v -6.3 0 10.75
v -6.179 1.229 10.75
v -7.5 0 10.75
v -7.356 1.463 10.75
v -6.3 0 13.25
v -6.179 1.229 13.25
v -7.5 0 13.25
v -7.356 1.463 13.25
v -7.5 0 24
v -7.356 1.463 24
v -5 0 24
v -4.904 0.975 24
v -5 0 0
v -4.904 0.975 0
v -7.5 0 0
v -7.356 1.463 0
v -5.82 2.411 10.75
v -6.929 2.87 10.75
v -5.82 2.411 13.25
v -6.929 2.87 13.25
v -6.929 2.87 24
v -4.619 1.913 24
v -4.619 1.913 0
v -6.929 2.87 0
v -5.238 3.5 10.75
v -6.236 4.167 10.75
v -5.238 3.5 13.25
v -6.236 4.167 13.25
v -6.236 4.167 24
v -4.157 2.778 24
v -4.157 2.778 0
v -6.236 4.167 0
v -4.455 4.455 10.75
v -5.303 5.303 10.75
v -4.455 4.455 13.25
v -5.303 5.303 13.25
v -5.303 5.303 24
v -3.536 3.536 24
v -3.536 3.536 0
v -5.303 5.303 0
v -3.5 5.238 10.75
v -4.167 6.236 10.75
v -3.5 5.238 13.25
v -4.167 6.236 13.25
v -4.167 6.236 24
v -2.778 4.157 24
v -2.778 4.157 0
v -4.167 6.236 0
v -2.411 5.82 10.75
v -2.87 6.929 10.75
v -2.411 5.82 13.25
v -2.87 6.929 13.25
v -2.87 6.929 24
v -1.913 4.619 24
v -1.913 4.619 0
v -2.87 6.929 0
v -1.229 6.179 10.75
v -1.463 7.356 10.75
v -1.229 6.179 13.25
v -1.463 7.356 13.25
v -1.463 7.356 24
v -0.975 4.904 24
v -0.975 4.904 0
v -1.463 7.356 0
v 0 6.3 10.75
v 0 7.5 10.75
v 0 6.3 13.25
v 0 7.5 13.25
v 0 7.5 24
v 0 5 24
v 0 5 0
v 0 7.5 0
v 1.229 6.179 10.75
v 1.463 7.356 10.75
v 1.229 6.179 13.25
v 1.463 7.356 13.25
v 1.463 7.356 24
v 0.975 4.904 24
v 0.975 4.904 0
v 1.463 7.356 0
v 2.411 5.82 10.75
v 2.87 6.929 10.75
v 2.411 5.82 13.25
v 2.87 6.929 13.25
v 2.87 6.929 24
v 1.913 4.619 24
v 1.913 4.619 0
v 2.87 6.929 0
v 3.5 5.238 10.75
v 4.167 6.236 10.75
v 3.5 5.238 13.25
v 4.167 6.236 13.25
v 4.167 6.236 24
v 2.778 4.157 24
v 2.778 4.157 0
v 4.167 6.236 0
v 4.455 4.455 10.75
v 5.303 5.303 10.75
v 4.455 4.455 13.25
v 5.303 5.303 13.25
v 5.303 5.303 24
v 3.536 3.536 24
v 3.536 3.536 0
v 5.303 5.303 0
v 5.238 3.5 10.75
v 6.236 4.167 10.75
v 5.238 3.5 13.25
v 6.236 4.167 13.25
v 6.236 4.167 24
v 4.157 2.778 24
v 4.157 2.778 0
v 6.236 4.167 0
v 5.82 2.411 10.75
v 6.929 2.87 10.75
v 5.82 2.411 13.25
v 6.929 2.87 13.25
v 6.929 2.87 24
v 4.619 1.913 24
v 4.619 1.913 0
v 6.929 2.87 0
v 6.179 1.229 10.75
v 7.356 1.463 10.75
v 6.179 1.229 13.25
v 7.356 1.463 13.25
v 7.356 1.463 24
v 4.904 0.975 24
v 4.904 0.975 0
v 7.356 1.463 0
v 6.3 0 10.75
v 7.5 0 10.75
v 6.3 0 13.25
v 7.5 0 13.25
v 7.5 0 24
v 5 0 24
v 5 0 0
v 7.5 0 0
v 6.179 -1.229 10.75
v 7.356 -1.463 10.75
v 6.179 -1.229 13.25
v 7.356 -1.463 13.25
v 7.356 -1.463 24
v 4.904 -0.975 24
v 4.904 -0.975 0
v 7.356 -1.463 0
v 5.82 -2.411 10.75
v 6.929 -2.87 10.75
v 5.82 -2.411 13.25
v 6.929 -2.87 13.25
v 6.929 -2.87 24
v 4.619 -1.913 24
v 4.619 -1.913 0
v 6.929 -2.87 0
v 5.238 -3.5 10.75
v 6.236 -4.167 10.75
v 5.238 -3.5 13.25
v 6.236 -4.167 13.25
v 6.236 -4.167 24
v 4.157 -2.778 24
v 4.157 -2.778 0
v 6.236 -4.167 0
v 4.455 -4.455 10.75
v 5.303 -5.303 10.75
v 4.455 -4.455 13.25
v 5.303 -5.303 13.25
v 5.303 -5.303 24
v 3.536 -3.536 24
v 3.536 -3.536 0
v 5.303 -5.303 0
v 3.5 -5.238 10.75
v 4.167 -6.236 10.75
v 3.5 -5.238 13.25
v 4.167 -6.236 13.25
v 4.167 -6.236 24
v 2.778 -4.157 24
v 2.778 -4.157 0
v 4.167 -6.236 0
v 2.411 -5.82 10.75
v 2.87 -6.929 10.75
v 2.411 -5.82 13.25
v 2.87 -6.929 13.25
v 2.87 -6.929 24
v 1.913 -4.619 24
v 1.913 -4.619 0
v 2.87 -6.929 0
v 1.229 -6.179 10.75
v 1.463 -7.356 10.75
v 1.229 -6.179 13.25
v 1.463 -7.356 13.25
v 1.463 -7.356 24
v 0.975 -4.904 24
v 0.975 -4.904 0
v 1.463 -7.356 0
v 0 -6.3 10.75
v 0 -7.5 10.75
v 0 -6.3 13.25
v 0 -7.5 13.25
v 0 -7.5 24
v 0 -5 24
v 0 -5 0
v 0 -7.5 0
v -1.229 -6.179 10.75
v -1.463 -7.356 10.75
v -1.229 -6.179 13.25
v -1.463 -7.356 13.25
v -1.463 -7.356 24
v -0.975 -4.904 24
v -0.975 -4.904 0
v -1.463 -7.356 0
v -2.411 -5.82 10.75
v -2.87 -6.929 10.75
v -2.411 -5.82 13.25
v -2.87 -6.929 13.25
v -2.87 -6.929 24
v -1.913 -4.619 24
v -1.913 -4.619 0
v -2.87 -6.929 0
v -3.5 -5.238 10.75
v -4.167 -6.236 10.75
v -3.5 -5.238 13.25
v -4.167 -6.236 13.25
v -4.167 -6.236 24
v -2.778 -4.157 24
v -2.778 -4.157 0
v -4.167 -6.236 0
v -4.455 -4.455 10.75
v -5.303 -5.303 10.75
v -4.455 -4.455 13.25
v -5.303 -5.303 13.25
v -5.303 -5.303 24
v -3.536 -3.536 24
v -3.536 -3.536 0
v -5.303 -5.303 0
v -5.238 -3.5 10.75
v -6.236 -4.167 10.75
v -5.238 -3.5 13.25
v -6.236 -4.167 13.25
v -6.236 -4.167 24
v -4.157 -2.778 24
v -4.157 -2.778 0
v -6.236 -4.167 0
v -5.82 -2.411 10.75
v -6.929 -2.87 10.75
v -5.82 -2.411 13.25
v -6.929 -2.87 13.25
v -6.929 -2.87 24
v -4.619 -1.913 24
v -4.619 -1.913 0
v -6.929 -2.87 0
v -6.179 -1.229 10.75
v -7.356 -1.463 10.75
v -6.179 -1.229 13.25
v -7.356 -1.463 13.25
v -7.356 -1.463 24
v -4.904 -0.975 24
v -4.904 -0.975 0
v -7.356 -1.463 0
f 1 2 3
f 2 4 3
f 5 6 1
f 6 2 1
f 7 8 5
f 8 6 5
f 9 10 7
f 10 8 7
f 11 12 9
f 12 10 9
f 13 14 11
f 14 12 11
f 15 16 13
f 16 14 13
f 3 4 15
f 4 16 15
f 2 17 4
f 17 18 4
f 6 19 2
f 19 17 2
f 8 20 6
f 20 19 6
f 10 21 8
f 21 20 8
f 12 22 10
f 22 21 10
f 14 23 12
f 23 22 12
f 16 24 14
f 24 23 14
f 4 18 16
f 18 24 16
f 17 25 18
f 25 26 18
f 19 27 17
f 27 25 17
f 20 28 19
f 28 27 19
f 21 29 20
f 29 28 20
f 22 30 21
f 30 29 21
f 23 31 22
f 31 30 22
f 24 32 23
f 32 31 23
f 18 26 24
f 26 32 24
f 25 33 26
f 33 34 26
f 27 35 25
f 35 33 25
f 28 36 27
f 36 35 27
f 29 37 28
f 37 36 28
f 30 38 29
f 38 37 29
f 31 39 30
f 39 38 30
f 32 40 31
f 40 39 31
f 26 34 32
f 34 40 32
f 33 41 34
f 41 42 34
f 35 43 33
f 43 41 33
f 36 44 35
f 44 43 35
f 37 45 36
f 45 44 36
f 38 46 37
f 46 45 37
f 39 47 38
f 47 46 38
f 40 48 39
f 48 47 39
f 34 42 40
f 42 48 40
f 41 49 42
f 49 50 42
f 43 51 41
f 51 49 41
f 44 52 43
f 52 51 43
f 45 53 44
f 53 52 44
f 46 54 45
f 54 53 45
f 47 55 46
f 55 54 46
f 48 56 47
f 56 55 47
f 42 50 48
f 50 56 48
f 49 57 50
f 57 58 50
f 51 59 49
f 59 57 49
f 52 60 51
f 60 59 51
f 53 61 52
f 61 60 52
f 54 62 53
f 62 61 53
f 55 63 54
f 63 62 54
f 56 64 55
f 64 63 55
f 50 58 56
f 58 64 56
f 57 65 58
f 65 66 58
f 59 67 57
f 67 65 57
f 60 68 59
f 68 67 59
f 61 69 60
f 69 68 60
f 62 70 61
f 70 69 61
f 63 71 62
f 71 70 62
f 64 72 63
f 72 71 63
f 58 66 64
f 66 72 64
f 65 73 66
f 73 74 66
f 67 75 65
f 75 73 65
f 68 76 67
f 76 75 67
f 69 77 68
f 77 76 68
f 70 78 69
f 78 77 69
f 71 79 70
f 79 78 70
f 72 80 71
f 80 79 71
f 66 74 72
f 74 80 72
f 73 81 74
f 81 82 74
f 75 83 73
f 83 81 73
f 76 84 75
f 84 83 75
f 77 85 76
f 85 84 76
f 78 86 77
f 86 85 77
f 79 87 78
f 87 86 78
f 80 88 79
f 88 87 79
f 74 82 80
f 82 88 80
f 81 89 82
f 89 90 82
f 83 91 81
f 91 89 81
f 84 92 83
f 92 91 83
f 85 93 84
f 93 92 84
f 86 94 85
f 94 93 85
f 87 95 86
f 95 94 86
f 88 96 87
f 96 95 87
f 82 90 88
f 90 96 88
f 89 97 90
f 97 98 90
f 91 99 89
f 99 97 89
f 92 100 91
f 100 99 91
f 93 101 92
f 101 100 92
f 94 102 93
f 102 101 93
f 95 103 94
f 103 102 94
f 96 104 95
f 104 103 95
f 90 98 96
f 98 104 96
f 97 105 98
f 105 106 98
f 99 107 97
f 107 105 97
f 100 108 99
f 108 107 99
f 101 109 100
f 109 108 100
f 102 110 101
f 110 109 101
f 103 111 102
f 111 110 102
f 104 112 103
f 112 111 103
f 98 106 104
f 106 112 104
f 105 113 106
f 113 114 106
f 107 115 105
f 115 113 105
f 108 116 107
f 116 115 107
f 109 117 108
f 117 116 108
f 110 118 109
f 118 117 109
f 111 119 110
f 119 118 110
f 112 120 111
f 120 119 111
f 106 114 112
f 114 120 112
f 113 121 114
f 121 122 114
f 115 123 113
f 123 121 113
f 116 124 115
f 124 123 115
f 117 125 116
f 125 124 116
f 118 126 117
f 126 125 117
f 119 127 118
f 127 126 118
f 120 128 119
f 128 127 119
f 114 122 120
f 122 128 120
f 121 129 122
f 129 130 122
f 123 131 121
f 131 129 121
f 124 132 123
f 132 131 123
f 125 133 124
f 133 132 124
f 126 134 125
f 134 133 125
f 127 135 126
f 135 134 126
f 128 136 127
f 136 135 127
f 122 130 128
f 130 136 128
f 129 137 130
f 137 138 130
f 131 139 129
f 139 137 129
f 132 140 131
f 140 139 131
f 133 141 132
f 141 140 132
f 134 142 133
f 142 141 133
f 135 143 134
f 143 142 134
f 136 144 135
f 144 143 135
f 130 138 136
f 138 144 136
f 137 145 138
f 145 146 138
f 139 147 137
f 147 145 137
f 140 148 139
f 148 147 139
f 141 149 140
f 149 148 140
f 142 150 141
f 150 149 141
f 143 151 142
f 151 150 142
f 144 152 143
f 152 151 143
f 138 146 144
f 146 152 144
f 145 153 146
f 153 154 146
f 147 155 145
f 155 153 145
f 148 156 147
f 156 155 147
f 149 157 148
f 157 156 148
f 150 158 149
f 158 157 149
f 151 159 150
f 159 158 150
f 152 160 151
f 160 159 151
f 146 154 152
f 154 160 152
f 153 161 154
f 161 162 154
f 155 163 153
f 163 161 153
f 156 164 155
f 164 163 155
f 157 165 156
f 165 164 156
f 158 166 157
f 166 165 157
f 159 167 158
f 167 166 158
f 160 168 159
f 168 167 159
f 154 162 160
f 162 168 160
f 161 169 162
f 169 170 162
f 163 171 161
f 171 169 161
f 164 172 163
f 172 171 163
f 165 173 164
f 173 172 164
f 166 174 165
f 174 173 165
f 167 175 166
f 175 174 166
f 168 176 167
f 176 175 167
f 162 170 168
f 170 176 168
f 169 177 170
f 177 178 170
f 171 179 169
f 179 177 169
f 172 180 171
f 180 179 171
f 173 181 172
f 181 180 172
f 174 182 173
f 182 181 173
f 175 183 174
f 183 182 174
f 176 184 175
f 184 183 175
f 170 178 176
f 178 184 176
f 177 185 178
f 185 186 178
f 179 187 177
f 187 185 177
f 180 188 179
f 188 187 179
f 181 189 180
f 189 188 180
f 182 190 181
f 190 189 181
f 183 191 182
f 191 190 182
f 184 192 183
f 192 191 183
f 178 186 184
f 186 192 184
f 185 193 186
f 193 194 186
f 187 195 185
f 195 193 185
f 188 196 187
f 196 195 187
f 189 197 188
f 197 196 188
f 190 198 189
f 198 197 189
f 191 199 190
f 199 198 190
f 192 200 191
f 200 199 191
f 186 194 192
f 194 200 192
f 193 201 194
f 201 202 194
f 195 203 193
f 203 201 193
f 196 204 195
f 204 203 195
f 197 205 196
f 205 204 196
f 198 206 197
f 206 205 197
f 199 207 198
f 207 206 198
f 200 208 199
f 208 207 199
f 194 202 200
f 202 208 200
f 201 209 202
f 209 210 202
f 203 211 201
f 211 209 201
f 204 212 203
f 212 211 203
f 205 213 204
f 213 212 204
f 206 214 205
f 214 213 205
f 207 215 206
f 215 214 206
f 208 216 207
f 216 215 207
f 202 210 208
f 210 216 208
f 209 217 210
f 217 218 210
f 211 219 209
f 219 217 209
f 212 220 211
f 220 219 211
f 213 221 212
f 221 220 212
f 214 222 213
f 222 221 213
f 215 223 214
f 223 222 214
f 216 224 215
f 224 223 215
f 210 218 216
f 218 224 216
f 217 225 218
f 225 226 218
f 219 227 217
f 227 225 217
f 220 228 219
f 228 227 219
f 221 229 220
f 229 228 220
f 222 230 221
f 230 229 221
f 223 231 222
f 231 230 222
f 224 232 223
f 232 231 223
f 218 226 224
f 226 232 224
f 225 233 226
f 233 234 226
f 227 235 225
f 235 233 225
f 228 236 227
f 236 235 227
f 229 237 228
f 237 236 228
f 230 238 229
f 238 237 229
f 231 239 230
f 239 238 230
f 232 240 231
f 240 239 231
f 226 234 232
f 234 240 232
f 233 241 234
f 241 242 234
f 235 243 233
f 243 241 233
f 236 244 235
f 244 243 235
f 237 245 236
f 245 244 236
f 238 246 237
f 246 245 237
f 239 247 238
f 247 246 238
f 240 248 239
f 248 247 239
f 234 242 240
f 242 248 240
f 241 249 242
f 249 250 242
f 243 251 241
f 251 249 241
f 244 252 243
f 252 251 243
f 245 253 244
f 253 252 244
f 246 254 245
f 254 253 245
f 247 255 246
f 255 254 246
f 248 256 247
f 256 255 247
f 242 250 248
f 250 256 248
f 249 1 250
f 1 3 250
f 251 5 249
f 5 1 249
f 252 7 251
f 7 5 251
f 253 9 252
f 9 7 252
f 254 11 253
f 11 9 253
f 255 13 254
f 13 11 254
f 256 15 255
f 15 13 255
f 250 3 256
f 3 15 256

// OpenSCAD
$fn = 32;

// ----------------------------------------------------------------------
// Grooved revolve: plain_grooves, bore R5
// ----------------------------------------------------------------------

// --- parameters (mm) ---
bore_r = 5;               // bore radius
outer_r = 7.5;            // outer radius of the body
total_h = 24;             // overall height, Z
wall = 2.5;               // radial wall thickness
groove_w = 2.5;           // groove width
groove_d = 1.2;           // groove depth
grooves = 1;              // number of outer grooves

bbox_x = 2 * outer_r;  // full diameter
bore_d = 2 * bore_r;  // bore diameter
body_d = 2 * outer_r;  // body diameter
revolve_angle = 360;  // full turn around the Z axis

profile = [[5, 0], [7.5, 0], [7.5, 10.75], [6.3, 10.75], [6.3, 13.25], [7.5, 13.25], [7.5, 24], [5, 24]];  // primary outline, 8 points, counter clockwise

// --- the one profile operation ---
rotate_extrude(angle = revolve_angle) polygon(points = profile);
